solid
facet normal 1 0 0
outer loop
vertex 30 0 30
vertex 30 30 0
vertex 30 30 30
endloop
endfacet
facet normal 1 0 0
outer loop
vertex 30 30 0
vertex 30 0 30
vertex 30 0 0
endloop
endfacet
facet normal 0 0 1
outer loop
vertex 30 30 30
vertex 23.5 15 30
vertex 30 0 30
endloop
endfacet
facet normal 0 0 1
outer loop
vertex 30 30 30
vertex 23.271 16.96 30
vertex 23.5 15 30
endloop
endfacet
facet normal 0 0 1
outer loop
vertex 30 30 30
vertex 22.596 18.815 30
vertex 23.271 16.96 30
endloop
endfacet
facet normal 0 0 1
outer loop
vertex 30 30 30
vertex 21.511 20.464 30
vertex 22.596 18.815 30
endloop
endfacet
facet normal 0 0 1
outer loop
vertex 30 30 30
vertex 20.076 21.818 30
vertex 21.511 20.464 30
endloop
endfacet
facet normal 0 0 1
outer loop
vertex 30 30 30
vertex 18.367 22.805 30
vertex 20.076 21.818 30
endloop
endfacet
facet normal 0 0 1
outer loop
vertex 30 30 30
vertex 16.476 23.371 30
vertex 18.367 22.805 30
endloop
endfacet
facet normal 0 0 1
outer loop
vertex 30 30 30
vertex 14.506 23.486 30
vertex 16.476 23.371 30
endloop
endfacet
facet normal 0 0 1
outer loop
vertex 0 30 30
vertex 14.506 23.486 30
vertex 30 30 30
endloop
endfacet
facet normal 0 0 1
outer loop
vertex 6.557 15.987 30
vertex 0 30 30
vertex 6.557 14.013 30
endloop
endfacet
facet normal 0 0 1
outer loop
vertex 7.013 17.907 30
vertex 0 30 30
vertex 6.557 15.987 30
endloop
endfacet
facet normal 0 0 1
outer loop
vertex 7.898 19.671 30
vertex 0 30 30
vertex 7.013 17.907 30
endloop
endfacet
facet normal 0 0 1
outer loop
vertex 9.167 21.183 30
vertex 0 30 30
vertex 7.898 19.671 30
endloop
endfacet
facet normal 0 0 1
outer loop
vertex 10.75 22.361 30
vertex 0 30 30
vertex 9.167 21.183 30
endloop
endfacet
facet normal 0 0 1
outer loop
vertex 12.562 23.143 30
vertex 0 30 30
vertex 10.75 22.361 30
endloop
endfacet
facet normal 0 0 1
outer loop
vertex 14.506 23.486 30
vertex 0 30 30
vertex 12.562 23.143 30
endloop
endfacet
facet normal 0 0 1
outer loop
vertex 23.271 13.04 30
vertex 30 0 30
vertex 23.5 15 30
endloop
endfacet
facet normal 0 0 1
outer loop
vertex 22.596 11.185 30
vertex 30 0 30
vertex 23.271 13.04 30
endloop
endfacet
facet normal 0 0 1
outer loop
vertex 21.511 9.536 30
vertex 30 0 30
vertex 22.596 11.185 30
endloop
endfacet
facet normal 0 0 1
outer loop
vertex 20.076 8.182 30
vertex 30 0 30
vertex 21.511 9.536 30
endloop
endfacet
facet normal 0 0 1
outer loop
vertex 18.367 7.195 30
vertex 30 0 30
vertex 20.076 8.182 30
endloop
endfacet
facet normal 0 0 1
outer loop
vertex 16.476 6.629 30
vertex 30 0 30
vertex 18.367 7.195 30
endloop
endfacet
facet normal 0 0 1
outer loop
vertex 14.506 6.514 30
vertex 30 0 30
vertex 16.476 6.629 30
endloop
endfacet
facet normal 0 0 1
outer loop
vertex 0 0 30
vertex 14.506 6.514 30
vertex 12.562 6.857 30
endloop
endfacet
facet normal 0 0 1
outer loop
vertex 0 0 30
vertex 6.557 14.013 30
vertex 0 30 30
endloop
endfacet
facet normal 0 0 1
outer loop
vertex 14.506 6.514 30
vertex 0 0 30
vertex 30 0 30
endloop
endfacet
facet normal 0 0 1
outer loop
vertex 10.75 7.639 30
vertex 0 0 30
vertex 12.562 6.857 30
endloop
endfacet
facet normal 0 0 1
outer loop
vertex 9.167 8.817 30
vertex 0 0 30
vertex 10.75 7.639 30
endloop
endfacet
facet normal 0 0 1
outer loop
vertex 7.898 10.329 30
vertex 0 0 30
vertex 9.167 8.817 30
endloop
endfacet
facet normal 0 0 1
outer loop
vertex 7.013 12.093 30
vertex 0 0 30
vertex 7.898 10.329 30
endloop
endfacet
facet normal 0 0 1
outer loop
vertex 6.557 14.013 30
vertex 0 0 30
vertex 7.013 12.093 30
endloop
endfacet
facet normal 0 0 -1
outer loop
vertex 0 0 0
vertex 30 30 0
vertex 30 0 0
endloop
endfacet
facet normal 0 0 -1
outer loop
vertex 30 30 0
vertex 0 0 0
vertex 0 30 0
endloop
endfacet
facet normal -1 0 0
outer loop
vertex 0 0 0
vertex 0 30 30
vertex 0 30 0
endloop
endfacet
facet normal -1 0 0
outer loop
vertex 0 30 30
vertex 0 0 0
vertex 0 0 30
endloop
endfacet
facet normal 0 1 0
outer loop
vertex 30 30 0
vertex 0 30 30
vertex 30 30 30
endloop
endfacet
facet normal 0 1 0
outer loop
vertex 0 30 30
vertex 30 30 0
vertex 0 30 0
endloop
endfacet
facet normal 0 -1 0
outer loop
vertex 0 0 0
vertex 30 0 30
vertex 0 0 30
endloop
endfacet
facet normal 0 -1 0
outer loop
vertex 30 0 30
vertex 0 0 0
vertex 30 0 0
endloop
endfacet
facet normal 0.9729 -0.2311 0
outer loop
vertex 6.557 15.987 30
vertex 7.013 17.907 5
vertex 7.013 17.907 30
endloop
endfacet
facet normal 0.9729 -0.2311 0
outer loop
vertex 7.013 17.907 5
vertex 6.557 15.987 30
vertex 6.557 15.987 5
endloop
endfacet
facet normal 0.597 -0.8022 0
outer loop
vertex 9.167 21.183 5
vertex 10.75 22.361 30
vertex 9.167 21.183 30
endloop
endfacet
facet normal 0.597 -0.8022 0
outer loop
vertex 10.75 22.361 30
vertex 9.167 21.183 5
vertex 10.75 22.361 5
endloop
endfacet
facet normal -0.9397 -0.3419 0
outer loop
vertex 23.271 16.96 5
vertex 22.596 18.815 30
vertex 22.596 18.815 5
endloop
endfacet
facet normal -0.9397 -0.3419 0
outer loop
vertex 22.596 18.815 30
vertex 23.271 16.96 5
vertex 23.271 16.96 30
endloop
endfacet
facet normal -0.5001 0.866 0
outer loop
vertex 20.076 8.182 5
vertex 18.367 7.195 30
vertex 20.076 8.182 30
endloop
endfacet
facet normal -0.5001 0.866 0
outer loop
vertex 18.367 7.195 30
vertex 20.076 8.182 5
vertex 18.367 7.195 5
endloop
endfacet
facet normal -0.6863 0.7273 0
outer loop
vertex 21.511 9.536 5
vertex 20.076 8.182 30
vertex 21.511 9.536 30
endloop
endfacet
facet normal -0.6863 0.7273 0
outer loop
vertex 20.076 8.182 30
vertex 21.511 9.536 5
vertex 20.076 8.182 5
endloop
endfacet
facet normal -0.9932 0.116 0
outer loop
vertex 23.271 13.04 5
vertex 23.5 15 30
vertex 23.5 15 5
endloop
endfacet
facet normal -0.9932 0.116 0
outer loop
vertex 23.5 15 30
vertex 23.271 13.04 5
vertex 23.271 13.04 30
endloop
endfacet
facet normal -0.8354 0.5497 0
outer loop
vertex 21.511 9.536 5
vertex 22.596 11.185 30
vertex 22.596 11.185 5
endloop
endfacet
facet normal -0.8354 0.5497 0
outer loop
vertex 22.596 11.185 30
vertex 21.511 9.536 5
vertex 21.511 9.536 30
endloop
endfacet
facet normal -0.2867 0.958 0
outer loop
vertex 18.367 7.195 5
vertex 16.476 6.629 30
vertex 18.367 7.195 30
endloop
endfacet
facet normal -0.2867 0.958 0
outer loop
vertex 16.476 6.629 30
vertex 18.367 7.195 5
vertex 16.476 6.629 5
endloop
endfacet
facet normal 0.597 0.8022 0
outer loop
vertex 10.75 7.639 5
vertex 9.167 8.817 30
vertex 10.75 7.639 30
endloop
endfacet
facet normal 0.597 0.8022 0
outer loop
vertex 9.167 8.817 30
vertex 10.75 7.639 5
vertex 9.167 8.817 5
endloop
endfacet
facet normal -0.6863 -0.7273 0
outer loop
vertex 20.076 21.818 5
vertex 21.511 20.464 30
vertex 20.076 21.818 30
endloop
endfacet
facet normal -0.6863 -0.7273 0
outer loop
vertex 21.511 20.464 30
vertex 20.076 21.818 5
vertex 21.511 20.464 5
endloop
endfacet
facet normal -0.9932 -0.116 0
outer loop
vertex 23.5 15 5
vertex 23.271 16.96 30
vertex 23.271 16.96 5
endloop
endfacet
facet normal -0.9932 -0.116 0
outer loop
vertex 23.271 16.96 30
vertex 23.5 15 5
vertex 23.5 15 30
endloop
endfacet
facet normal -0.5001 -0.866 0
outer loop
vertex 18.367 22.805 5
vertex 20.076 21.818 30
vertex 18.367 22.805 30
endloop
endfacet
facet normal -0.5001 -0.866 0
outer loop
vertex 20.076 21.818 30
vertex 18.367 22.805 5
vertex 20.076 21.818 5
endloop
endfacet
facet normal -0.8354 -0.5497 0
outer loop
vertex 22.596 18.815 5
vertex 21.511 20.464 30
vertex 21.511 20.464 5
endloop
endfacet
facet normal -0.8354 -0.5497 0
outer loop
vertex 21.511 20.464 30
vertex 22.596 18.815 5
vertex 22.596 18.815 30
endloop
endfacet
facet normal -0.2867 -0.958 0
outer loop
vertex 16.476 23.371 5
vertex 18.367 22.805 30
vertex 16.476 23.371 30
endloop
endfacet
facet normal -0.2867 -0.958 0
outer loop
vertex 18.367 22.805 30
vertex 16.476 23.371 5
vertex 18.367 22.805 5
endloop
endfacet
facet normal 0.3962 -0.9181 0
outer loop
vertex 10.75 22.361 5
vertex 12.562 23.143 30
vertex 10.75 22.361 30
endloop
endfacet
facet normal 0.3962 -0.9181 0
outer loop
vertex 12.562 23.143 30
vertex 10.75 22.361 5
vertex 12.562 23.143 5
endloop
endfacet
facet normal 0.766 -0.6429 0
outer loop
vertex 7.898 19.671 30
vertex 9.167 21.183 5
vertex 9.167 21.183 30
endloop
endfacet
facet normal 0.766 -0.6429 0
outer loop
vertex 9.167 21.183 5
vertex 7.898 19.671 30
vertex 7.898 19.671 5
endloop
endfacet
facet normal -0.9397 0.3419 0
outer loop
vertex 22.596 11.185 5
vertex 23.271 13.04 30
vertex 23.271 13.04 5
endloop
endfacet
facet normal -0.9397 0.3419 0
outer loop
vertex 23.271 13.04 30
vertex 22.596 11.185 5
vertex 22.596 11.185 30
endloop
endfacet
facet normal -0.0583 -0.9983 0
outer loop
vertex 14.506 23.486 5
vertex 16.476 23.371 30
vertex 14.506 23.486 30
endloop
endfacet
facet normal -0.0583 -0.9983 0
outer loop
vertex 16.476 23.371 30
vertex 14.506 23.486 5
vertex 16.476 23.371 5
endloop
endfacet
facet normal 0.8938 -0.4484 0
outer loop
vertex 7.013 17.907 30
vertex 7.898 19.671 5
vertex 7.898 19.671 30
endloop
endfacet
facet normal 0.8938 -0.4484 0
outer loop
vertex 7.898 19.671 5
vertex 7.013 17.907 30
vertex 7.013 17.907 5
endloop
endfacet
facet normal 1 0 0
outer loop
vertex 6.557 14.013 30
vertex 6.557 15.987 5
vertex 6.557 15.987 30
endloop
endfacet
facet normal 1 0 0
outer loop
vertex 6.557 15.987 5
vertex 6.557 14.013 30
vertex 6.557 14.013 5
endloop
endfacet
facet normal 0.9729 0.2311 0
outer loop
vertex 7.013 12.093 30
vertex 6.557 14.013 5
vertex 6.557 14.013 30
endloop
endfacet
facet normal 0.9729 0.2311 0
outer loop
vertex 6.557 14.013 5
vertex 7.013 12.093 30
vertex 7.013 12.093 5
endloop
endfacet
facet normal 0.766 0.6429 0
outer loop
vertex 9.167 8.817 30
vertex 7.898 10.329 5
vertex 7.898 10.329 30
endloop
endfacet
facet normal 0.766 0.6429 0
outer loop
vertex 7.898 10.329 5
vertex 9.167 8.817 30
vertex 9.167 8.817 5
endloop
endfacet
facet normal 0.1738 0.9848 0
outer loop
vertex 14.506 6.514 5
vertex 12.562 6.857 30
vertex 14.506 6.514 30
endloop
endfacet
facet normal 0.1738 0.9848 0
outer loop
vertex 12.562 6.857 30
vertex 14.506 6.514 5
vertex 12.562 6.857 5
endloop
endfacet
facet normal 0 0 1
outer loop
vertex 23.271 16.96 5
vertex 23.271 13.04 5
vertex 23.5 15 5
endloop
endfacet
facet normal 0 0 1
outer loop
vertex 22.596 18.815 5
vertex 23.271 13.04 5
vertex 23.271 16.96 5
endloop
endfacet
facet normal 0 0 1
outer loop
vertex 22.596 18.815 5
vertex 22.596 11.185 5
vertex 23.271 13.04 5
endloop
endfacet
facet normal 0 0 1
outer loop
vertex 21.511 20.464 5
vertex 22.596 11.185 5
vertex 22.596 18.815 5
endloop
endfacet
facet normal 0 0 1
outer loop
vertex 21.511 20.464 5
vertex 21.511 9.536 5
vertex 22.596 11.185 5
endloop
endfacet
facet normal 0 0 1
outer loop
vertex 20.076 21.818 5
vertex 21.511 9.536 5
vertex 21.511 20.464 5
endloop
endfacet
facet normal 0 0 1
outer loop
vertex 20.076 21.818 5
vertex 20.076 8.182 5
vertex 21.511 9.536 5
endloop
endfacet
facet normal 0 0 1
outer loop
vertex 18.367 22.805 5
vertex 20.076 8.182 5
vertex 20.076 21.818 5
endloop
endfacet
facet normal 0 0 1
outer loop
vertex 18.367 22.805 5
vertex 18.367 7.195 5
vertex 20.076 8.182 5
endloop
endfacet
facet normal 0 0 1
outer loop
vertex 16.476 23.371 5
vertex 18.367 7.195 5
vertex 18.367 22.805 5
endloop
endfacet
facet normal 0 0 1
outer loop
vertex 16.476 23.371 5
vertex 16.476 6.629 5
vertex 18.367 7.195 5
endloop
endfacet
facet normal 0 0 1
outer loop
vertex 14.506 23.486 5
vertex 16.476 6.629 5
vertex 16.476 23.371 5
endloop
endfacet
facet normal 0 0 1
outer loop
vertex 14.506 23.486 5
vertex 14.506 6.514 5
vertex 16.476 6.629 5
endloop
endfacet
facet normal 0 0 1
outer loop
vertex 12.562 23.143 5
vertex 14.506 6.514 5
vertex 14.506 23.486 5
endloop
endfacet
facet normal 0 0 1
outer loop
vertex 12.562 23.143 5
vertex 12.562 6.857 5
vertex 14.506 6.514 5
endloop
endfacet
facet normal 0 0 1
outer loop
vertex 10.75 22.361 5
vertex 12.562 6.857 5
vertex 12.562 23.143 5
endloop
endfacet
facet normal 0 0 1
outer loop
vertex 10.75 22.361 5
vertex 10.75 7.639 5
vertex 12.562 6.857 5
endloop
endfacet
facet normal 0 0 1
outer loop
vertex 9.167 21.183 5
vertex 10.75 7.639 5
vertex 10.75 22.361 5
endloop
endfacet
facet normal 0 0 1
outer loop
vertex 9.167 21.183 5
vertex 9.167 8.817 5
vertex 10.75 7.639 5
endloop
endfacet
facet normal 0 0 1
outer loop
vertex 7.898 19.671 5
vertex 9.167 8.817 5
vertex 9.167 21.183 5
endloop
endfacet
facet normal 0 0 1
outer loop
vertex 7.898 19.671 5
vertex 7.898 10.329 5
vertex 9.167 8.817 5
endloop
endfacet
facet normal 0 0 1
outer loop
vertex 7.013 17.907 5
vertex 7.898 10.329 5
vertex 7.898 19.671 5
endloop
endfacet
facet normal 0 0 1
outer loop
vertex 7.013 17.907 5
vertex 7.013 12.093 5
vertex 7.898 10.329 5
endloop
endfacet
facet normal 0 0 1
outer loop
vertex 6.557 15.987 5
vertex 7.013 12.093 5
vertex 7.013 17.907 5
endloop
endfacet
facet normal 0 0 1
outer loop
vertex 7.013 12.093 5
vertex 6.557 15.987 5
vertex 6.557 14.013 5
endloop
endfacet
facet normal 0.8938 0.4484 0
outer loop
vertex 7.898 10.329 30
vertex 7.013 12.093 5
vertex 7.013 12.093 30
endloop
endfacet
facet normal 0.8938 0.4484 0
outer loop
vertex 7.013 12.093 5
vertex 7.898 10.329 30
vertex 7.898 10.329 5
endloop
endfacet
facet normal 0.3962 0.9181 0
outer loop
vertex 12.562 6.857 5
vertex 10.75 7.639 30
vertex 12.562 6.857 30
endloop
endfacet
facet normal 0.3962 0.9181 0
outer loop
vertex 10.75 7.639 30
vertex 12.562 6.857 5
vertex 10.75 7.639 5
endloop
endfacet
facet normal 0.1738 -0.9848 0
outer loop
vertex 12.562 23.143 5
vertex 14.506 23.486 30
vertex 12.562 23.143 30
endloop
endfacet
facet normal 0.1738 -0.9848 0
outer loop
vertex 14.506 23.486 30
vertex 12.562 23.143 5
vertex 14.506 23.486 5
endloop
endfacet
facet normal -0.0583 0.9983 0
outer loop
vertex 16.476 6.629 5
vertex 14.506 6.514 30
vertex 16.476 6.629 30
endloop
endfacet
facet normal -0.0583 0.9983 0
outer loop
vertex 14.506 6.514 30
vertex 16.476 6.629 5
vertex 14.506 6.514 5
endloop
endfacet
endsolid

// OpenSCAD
difference()
{
    cube([30,30,30]);
    translate([15,15,5]) cylinder(h=27,d=17);
}
